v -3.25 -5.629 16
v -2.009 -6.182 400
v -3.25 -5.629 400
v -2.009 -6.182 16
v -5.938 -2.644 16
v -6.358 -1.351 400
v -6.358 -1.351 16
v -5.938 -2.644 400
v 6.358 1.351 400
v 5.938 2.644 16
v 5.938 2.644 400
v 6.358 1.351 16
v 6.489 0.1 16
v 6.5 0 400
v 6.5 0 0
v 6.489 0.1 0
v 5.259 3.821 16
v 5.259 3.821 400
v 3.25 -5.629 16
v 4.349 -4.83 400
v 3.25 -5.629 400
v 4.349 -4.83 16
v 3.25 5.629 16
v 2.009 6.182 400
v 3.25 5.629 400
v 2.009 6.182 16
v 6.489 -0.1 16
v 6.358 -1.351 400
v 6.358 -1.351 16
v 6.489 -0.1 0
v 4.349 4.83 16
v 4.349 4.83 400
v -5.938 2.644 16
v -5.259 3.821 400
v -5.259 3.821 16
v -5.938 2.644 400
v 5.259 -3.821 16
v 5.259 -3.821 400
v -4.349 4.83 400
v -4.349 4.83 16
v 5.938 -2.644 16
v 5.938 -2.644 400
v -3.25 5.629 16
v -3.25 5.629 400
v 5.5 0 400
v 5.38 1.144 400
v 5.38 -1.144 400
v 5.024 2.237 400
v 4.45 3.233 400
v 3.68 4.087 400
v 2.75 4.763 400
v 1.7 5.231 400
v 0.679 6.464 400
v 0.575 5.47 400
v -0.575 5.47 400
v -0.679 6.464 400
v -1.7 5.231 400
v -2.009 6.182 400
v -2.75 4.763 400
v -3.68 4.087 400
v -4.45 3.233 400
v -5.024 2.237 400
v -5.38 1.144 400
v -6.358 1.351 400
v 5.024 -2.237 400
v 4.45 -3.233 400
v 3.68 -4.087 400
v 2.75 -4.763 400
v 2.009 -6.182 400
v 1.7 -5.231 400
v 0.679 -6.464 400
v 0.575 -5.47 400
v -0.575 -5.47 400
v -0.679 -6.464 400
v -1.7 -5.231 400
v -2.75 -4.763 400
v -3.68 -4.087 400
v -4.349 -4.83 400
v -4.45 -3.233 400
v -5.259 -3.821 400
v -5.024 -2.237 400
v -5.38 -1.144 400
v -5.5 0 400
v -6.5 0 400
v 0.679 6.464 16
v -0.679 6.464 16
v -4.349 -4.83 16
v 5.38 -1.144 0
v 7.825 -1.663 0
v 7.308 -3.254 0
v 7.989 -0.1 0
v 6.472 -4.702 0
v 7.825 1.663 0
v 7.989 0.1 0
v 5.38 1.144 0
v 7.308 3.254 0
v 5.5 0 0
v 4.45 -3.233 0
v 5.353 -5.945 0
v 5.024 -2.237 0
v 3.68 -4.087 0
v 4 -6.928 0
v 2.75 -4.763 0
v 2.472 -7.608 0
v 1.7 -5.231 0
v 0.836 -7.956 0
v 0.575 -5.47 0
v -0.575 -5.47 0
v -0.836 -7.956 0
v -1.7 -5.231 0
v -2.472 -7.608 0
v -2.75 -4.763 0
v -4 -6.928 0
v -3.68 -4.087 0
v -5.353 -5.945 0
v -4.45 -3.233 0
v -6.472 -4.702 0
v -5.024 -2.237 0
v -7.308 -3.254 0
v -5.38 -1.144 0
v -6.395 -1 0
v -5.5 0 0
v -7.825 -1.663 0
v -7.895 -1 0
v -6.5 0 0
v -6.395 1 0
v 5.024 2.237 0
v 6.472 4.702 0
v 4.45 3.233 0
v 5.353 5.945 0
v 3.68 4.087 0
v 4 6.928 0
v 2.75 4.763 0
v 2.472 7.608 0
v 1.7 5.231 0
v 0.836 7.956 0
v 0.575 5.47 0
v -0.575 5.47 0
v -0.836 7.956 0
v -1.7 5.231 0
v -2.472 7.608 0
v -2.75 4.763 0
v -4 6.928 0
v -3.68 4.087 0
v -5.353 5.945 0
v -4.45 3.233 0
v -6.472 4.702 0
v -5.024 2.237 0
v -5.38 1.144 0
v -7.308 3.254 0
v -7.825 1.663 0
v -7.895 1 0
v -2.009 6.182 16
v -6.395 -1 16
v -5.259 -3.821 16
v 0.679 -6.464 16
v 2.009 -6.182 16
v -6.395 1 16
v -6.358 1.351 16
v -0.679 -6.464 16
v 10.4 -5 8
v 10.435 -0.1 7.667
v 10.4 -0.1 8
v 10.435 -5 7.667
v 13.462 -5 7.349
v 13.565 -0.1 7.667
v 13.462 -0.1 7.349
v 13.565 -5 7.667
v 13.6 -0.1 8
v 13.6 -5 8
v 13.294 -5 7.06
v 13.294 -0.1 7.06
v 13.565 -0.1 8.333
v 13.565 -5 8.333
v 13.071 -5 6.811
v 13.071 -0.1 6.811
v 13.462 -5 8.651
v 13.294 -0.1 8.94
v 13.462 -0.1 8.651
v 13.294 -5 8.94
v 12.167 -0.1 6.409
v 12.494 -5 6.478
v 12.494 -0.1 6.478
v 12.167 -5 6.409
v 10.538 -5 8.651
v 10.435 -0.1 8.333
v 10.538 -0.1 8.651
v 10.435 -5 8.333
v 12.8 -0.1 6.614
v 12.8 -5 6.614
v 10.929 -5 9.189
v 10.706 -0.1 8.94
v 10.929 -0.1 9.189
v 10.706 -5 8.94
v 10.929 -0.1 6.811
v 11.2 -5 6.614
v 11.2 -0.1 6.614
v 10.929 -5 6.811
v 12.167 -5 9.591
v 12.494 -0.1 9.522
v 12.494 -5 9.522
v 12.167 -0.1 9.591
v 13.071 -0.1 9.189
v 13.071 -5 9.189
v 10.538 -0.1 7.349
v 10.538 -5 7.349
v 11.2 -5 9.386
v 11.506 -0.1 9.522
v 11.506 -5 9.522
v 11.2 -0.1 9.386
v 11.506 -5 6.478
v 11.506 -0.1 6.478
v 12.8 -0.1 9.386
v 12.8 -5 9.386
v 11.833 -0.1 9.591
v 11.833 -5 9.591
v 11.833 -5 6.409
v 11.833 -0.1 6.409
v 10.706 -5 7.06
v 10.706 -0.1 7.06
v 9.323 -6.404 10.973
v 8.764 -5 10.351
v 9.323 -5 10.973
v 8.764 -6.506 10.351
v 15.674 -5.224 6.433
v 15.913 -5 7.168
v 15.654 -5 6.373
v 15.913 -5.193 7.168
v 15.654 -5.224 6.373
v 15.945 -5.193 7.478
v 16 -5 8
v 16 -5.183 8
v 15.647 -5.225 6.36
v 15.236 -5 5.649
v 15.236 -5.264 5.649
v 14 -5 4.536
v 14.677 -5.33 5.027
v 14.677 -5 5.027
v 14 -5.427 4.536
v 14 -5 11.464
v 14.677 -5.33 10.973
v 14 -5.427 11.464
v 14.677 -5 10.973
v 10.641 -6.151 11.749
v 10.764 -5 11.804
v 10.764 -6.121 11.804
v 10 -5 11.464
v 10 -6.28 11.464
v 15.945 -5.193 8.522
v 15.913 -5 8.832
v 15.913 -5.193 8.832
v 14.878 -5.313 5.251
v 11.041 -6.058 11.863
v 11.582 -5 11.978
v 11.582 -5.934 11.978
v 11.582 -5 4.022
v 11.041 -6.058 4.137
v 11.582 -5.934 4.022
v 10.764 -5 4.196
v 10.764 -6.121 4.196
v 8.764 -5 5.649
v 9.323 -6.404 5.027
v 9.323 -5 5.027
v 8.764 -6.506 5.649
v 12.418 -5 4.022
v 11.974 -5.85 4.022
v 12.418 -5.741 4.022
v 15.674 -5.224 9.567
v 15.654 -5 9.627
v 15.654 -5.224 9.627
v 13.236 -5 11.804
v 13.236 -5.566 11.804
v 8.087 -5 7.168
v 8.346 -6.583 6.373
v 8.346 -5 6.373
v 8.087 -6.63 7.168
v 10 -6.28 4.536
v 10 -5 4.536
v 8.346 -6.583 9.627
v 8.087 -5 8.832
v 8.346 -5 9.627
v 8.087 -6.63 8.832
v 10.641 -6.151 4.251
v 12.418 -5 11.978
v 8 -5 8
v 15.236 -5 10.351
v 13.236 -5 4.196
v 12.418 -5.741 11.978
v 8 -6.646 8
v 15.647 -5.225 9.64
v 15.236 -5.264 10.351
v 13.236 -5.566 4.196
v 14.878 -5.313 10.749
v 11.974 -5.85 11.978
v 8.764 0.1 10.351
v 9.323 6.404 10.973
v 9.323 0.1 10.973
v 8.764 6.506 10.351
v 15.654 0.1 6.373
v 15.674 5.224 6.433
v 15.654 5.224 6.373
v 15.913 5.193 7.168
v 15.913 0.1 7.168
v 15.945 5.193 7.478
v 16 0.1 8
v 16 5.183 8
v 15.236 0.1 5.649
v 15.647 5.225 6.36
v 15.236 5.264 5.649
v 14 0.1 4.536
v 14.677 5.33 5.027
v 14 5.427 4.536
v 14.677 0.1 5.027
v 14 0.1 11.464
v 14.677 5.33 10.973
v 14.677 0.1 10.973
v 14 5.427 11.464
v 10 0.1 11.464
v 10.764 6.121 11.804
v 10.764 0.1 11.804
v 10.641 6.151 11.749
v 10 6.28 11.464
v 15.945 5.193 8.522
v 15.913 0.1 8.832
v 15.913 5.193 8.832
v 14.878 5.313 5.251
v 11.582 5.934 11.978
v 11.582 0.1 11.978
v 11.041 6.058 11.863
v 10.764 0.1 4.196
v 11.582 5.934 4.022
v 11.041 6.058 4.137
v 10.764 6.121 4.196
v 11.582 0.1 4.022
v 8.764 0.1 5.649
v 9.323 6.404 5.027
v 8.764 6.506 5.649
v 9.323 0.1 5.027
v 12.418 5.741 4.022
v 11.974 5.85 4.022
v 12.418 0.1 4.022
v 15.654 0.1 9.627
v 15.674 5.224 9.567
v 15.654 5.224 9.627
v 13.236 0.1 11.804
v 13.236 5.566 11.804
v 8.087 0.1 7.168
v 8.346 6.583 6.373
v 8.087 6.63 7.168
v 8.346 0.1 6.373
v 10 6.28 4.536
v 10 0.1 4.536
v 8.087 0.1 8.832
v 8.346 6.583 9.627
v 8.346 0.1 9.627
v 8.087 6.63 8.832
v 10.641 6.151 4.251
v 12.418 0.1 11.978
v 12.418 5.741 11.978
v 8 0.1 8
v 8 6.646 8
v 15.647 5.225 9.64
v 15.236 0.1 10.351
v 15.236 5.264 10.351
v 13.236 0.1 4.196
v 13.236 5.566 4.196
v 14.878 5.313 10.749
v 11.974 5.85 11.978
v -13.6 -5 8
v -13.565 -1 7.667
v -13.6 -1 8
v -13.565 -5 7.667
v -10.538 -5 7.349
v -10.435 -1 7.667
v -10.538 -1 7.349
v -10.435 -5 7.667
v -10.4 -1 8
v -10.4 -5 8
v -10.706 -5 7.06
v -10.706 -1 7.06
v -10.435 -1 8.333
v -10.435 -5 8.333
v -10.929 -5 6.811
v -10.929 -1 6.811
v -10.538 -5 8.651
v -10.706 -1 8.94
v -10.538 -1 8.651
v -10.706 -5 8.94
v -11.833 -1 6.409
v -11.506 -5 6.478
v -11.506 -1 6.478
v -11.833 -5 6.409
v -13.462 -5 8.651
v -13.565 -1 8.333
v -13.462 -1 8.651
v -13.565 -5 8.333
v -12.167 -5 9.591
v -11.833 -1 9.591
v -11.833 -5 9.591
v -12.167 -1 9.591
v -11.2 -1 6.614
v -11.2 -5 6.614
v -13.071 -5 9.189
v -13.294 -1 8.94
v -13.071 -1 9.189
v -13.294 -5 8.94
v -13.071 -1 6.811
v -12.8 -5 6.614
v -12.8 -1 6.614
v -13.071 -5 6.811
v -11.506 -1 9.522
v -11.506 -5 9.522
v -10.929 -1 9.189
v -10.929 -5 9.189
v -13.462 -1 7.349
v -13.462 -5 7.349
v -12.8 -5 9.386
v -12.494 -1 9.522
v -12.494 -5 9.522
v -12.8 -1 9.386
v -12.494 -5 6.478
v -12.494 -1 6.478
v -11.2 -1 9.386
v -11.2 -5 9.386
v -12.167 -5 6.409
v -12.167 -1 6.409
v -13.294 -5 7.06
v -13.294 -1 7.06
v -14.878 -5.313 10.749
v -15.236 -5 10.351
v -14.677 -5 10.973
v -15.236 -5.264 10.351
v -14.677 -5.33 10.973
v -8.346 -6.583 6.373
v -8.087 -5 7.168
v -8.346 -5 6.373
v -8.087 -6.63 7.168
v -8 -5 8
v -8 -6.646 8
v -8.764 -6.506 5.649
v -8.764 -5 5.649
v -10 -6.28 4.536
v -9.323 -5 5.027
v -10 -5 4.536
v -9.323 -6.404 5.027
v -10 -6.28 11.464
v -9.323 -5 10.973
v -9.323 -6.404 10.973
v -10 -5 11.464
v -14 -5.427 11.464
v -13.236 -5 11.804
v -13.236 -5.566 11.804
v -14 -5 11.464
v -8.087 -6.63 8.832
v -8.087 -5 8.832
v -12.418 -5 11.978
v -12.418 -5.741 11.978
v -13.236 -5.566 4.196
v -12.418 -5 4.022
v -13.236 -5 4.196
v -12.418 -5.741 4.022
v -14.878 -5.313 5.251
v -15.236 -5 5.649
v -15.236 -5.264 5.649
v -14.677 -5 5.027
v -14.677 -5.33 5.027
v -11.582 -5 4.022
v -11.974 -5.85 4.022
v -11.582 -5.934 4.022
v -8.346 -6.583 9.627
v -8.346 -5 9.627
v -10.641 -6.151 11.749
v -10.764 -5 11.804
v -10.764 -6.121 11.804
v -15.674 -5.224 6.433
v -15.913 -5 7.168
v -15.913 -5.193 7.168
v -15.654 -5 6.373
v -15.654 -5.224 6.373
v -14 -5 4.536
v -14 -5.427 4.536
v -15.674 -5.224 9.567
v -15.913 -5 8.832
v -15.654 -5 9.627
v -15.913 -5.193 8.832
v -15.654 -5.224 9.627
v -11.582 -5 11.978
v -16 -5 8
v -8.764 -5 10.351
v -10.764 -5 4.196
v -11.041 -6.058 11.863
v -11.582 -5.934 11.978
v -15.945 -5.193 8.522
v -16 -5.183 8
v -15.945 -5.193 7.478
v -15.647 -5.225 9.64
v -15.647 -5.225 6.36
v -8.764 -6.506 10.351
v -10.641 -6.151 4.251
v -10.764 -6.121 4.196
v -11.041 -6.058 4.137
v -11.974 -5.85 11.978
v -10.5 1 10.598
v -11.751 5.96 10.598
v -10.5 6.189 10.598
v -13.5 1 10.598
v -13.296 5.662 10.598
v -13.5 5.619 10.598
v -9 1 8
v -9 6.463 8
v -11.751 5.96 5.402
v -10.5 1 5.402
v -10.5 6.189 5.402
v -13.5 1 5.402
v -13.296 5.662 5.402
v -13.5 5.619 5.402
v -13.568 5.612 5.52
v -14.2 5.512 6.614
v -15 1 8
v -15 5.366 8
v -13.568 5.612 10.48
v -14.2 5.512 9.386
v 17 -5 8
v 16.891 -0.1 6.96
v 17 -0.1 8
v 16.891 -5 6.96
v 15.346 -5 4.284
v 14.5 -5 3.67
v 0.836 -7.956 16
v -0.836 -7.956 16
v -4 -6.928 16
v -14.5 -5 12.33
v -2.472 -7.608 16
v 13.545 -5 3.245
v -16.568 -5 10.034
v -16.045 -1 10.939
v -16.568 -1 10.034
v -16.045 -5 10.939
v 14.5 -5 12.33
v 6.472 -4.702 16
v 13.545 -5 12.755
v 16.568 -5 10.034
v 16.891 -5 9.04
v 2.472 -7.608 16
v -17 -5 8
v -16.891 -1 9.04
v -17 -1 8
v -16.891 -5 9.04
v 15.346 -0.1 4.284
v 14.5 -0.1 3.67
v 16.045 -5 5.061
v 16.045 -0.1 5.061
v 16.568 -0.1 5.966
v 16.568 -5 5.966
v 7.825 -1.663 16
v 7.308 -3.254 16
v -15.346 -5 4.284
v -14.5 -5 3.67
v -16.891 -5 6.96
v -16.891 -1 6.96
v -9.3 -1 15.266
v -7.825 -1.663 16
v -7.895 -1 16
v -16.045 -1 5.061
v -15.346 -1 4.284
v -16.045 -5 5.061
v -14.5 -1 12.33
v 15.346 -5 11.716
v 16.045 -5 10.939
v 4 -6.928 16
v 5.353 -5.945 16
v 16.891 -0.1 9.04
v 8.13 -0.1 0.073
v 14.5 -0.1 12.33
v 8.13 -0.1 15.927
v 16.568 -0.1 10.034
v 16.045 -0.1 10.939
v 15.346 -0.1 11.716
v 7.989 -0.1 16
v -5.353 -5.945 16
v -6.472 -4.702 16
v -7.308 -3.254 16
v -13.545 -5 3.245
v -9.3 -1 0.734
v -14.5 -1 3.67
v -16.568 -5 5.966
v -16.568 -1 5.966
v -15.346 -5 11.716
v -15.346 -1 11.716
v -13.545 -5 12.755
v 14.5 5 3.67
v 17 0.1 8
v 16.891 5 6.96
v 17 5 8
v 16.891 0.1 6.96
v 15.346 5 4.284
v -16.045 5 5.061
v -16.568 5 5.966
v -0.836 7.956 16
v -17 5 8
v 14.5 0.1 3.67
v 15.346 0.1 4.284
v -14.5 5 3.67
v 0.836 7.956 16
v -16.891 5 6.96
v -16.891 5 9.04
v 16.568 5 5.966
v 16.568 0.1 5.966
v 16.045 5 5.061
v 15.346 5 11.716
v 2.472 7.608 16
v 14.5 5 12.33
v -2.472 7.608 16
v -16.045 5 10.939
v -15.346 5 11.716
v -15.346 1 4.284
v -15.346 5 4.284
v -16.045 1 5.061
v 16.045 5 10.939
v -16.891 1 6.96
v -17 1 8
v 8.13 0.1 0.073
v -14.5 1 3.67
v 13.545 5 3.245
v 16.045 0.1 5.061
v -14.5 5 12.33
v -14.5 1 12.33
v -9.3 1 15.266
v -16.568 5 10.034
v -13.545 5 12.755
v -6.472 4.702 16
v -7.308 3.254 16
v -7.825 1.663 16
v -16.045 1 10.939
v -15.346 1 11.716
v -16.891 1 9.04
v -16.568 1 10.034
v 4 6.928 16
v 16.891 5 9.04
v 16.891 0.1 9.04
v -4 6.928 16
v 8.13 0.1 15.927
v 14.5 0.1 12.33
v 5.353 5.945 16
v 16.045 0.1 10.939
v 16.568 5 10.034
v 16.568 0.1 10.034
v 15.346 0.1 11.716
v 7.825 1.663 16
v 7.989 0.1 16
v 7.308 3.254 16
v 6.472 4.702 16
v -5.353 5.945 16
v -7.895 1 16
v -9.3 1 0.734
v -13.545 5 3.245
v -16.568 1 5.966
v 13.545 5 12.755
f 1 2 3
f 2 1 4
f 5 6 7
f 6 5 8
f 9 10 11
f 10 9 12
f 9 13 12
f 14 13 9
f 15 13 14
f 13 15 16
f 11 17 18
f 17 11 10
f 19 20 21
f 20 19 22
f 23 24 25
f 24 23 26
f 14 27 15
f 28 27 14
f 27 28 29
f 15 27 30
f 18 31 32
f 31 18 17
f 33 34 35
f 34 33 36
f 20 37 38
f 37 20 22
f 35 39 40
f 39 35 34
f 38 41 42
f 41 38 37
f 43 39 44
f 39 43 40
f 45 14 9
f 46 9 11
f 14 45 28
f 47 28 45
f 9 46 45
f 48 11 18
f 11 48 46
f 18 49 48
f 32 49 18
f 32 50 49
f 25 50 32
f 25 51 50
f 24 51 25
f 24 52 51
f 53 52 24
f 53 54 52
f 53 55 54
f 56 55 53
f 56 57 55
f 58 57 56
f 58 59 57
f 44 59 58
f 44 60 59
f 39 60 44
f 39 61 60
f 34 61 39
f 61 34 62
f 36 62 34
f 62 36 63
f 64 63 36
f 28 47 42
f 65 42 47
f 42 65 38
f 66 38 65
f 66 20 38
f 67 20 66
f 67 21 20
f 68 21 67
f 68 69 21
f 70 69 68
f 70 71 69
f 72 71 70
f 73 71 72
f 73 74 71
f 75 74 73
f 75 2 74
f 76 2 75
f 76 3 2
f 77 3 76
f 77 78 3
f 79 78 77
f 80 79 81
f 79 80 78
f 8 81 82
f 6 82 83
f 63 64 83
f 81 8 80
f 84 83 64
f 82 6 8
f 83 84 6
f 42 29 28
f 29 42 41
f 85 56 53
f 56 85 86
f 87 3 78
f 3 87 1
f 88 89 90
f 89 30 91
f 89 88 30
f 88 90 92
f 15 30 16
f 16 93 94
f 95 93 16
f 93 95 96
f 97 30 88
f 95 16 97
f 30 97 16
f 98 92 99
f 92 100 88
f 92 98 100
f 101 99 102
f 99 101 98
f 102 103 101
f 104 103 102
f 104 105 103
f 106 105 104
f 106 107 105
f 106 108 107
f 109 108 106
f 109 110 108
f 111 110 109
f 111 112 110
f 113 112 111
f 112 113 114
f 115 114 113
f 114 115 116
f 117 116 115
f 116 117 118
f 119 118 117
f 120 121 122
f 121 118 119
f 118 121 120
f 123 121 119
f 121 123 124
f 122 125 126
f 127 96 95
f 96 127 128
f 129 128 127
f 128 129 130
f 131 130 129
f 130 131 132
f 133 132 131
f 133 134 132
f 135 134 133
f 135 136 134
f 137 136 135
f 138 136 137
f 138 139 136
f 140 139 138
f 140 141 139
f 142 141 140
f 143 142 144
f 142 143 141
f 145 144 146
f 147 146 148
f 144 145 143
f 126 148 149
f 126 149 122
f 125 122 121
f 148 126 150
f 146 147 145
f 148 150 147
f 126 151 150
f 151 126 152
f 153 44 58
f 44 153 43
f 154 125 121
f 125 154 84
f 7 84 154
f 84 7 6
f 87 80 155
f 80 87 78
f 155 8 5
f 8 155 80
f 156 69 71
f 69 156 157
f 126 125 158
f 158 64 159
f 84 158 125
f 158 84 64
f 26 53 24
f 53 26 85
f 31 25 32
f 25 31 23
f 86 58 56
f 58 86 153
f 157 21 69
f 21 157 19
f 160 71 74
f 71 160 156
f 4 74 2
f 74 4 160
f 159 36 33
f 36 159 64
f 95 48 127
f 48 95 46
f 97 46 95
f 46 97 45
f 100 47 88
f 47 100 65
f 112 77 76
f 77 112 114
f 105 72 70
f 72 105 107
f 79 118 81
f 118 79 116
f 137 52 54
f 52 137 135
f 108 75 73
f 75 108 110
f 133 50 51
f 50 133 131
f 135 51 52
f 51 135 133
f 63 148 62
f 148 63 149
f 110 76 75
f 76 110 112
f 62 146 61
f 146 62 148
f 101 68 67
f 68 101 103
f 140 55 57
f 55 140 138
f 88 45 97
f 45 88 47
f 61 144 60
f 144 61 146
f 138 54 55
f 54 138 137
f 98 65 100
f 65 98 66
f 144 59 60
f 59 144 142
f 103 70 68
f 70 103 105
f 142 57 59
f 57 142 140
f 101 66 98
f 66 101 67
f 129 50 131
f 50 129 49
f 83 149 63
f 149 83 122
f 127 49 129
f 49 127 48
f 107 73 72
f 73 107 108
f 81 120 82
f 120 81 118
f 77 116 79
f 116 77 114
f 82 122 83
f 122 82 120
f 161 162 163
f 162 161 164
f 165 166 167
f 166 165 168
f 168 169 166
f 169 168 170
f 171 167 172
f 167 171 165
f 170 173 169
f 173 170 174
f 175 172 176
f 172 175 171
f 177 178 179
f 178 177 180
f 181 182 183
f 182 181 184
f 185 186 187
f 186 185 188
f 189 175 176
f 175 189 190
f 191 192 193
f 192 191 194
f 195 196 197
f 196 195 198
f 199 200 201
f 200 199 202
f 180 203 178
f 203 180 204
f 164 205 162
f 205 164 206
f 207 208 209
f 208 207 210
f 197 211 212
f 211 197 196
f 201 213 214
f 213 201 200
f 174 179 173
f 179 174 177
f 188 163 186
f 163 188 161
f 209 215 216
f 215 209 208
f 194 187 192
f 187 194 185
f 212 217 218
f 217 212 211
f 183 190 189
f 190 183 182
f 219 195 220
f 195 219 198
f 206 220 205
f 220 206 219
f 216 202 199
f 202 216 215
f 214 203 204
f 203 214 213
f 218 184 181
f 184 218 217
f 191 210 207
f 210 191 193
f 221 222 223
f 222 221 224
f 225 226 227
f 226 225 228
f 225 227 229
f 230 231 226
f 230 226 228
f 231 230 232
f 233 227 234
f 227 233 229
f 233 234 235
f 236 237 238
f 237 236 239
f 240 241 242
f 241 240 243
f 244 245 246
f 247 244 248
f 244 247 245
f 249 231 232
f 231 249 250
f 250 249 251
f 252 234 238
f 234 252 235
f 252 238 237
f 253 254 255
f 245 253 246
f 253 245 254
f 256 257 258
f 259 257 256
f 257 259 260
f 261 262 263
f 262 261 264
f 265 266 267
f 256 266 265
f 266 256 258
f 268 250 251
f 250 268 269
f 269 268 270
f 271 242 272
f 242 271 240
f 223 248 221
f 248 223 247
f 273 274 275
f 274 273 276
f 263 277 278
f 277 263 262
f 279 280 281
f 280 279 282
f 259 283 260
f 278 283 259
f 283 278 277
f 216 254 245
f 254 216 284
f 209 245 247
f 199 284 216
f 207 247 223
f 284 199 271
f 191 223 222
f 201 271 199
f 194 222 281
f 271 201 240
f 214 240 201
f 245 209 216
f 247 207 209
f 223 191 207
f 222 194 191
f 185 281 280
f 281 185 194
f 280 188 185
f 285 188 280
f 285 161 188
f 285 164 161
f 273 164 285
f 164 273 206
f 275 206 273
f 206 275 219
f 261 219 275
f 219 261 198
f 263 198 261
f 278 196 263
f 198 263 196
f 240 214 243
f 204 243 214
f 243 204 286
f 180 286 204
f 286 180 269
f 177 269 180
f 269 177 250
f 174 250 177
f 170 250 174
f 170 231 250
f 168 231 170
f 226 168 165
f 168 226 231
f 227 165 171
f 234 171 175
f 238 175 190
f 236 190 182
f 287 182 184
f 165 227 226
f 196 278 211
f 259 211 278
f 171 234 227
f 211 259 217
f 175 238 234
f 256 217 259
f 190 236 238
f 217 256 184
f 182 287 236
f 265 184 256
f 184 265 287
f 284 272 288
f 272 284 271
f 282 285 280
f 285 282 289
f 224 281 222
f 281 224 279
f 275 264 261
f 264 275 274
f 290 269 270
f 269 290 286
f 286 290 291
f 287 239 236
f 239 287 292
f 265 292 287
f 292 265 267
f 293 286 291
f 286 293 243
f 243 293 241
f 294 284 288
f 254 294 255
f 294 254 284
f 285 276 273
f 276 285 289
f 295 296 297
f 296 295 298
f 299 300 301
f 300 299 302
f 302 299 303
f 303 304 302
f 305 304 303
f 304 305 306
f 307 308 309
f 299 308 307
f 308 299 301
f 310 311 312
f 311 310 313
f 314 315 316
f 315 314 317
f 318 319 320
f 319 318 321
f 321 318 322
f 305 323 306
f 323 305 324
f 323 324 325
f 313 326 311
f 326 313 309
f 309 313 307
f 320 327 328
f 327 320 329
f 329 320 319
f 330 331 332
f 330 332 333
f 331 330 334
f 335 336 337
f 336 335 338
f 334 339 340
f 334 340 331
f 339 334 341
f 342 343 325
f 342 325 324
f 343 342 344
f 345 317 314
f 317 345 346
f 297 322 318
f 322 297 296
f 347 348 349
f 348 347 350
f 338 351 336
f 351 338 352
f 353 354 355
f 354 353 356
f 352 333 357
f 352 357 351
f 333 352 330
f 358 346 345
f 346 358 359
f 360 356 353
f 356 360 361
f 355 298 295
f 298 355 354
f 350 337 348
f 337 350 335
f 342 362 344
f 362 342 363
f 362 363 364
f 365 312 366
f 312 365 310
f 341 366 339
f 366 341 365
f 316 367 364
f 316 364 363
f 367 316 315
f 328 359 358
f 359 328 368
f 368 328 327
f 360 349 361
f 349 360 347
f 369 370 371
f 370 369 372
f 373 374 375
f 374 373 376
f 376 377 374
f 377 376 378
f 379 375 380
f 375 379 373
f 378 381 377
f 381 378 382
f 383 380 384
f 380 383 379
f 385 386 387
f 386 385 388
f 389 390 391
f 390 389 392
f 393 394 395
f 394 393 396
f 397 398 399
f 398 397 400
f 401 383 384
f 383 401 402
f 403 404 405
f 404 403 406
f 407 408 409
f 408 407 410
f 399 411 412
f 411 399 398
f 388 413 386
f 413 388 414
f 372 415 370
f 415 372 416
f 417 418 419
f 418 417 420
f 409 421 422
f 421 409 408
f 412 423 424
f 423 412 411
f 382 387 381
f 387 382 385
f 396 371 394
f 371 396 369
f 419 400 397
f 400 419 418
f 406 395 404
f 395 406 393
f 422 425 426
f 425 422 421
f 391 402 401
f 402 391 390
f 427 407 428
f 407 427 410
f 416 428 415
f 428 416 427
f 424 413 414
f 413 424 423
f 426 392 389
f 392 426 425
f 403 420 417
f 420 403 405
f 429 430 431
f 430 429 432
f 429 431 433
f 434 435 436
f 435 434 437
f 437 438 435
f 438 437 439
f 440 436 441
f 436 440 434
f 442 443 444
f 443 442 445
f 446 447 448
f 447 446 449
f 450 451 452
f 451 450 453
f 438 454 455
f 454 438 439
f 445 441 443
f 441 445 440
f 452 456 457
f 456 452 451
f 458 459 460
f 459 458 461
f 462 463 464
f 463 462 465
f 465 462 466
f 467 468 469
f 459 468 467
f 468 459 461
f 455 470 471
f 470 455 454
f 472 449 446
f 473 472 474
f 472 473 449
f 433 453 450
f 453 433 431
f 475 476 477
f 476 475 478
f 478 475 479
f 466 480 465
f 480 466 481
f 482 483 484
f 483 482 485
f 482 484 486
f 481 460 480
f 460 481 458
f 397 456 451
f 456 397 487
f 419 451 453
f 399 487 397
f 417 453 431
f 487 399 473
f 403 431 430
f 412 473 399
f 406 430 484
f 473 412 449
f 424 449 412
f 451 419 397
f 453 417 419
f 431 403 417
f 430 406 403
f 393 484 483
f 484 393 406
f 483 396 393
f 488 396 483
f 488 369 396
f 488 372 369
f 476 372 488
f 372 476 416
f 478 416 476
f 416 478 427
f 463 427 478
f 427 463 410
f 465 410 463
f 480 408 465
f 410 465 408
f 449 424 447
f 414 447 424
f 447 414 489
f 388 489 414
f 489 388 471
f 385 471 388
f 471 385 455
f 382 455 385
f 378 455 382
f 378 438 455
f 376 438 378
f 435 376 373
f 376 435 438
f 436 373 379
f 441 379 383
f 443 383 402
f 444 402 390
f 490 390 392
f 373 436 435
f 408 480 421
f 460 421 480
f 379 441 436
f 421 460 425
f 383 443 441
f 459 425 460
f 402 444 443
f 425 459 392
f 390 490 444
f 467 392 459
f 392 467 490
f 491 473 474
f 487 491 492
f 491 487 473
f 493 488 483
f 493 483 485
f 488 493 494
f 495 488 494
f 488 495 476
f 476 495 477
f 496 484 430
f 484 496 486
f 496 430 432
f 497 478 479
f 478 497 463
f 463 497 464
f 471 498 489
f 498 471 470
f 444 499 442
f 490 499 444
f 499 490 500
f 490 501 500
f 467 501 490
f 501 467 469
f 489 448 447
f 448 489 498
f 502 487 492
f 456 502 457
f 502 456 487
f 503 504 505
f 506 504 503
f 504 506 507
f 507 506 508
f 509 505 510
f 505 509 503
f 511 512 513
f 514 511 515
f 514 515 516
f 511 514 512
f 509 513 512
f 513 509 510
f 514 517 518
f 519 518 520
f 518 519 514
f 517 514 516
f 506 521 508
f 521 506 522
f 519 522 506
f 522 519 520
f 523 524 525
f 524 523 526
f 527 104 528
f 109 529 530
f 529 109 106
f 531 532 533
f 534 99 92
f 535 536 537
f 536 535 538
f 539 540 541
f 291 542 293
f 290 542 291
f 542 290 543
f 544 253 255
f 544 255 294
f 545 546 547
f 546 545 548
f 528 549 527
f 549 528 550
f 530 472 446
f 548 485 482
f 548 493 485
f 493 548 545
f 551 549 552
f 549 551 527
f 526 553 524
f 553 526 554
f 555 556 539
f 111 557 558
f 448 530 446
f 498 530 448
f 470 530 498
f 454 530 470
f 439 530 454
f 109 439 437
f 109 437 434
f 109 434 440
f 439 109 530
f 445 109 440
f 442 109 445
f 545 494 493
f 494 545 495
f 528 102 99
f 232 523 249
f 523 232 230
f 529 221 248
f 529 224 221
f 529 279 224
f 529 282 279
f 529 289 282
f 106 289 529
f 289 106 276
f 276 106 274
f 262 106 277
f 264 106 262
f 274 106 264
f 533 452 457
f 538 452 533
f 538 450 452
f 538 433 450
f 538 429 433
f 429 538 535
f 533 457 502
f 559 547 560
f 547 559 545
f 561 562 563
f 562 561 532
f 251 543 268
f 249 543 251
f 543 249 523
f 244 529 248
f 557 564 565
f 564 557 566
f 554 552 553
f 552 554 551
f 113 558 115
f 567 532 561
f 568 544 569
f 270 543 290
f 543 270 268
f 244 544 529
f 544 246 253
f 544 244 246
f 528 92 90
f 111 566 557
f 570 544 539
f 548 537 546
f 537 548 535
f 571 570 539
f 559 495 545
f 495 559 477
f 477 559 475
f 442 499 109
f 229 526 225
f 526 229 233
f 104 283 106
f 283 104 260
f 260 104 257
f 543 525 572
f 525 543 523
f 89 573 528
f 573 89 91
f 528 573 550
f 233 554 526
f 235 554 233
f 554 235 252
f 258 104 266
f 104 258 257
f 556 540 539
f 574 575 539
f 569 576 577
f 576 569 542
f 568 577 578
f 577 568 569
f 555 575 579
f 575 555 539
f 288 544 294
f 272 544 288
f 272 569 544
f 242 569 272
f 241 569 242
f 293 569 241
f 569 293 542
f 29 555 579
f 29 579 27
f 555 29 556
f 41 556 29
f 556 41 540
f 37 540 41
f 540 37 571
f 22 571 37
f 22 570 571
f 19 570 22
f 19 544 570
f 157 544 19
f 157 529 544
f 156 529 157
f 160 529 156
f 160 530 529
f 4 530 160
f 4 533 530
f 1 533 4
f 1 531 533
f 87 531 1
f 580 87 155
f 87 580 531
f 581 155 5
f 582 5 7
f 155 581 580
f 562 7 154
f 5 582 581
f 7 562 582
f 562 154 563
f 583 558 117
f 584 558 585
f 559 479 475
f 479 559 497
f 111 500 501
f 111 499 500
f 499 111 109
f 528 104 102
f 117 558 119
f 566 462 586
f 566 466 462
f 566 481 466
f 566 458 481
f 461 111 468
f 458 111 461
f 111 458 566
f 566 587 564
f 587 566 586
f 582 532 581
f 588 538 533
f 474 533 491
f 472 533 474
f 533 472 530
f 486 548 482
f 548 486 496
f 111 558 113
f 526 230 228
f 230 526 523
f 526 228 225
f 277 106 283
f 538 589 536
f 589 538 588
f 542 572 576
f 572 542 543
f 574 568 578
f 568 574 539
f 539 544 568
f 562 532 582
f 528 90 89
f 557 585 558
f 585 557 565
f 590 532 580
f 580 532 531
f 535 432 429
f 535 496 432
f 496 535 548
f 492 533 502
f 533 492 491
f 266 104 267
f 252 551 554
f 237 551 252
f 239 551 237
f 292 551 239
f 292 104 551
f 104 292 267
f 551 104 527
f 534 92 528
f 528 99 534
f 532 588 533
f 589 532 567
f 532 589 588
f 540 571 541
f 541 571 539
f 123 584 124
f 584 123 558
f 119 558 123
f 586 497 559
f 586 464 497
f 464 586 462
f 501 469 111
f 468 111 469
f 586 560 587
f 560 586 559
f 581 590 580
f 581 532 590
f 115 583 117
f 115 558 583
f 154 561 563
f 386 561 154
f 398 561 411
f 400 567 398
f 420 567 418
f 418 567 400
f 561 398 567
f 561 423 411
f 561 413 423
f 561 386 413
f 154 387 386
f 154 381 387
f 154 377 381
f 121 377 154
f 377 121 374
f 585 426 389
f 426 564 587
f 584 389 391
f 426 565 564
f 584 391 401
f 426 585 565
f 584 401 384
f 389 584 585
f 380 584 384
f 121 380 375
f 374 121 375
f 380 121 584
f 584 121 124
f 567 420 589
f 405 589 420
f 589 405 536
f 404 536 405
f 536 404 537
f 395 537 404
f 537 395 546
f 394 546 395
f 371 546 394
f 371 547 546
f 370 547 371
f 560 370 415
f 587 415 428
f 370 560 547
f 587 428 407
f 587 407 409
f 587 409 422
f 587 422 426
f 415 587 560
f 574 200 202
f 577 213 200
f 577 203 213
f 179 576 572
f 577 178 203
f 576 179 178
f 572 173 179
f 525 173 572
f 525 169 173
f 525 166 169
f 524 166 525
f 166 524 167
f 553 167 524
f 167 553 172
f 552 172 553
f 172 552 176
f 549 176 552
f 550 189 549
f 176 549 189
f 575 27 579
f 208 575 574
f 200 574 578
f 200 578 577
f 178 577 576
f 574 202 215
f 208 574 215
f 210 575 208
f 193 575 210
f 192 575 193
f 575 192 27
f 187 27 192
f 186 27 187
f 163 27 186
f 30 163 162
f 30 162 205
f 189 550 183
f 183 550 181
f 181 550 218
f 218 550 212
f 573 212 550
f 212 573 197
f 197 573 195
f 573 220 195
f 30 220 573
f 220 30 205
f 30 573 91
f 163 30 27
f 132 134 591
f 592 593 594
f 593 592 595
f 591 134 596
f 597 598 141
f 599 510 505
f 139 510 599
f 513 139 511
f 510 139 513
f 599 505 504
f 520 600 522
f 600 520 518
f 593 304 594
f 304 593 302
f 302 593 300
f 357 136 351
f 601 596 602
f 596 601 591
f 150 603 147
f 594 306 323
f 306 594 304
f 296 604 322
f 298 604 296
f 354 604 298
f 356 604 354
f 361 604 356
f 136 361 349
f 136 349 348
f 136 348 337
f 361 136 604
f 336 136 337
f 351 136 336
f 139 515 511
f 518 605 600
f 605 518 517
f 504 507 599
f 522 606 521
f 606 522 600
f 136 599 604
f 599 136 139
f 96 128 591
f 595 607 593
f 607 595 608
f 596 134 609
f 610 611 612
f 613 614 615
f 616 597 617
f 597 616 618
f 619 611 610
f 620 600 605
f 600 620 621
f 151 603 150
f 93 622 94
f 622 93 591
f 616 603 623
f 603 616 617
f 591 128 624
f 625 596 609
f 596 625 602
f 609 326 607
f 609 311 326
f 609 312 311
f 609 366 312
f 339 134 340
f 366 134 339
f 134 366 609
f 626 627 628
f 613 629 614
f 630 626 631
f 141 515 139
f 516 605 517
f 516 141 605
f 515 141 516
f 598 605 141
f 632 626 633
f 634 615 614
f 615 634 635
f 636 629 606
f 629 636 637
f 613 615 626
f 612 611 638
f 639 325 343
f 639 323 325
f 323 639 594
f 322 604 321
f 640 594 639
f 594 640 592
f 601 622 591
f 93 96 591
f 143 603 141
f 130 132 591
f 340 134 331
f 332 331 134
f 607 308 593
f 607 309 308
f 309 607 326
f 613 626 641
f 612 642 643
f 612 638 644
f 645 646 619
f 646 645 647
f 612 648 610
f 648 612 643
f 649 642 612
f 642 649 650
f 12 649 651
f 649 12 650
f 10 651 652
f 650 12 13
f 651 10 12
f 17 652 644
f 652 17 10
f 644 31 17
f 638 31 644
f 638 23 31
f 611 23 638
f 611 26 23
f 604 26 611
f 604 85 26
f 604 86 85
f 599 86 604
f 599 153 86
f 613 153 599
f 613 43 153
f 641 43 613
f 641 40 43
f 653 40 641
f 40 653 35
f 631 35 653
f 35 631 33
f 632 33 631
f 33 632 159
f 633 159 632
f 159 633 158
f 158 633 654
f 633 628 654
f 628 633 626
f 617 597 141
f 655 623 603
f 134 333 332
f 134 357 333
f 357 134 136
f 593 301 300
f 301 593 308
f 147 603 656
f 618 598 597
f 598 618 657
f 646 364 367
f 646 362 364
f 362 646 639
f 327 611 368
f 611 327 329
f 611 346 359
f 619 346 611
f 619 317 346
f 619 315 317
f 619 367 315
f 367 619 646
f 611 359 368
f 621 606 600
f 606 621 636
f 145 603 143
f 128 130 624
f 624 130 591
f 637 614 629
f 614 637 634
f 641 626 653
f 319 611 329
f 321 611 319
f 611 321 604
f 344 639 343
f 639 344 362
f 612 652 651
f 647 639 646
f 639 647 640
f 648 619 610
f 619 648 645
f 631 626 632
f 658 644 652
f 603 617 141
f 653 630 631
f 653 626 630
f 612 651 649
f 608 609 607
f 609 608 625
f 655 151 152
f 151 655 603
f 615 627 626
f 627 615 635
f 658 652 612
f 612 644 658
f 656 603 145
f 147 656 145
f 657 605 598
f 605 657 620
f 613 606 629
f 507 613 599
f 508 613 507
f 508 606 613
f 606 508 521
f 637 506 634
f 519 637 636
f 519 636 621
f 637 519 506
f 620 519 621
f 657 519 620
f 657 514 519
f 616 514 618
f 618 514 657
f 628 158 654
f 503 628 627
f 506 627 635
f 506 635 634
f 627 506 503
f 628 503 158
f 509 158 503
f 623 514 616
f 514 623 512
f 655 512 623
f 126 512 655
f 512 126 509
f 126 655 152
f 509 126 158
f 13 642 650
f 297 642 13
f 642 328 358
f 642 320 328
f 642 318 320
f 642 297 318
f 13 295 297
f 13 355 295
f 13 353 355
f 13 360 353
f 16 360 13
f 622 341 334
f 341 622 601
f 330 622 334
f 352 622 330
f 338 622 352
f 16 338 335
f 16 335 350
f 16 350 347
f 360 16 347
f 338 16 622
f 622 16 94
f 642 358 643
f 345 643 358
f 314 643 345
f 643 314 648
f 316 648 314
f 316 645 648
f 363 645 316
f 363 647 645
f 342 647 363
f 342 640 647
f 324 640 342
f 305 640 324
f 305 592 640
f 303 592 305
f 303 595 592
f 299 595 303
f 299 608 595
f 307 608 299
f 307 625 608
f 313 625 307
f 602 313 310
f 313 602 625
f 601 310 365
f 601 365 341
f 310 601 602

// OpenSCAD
// file: lib/ALU_profile_holder_top.scad
include <../../parameters.scad>



module ALU_profile_holder_top(deep=35) {
    wall_thickness = ALU_profile_holder_wall_thickness;
    
    module screw_holes() {
        translate([wall_thickness/2, 8, ALU_profile_width/2]) {
            rotate([0, 90, 0]) 
                cylinder(d=M6_screw_diameter, h=wall_thickness*2, center=true, $fn=20);
        }
        translate([wall_thickness/2, deep-10, ALU_profile_width/2]) {
                rotate([0, 90, 0])
                cylinder(d=M6_screw_diameter, h=wall_thickness*2, center=true, $fn=20);
            
        }
    }
    
    difference() {
        cube([ALU_profile_width+wall_thickness*2, deep+wall_thickness*2, ALU_profile_width]);
        translate([wall_thickness, -0.1, -0.1])
            cube([ALU_profile_width, deep+0.1, ALU_profile_width+0.2]);
        
        screw_holes();
        translate([ALU_profile_width+wall_thickness, 0, 0])
            screw_holes();
    }
}

ALU_profile_holder_top(35);
// file: ../parameters.scad
maximum_printable_size = 150;

layer_thickness = 0.3;
global_clearance = 0.5;


//Screw diameter and nut for M10 [mm]
M10_screw_diameter = 10.4;
M10_head_height = 10;
M10_head_diameter = 16+0.5;
M10_nut_height = 10.5;
M10_nut_diameter = 25.5;
M10_nut_pocket = 22.3;

//Screw diameter for M8 [mm]
M8_screw_diameter = 8.6;
M8_head_height = 8;
M8_head_diameter = 13.5;
M8_nut_height = 7.5;
M8_square_nut_thin_height = 4.5;
M8_nut_diameter = 14.4 + 0.5;
M8_nut_pocket = 13 + 0.5;
M8_washer_diameter = 16;
M8_washer_thickness = 1.5;


//Screw diameter and nut for M6 [mm]
M6_screw_diameter=6.5;
M6_head_diameter = 10+0.5;
M6_head_height = 6;
M6_nut_height = 4.9;
M6_nut_diameter = 11.8;
M6_nut_pocket = 10.4;
M6_square_nut_height = 3;
M6_square_nut_diameter = 10;
M6_washer_thickness = 1.6;

//Screw diameter and nut for M5 [mm]
M5_screw_diameter=5.5;
M5_head_height = 5;
M5_head_diameter = 13+0.5;
M5_nut_height = 4.5;
M5_nut_diameter = 9.4;
M5_nut_pocket = 8.4;

//Screw diameter and nut for M4 [mm]
M4_screw_diameter=4.5;
M4_screw_head_height = 4;
M4_nut_height = 3.2;
M4_nut_diameter = 8.4;
M4_nut_pocket = 7.5;

//Screw diameter and nut for M3 [mm]
M3_screw_diameter = 3.2;
M3_nut_height = 2.7;
M3_nut_diameter = 6.6;
M3_nut_pocket = 5.6;
M3_screw_head_height = 3;

//Screw diameter and nut for M2,5 [mm]
M2_5_screw_diameter = 2.7;
M2_5_nut_height = 2.3;
M2_5_nut_diameter = 6;
M2_5_nut_pocket = 5.5;

// kulove lozisko

bearing_efsm_08_h = 33+1;
bearing_efsm_08_m = 22;
bearing_efsm_08_db = 18;
bearing_efsm_08_ag = 10.5;
bearing_efsm_08_n = M4_screw_diameter;
bearing_efsm_08_a1 = 5.5;
bearing_efsm_08_d = 8.25;
bearing_efsm_08_B = 8; // ball height

bearing_efsm_10_h = 38+1;
bearing_efsm_10_m = 26;
bearing_efsm_10_db = 21.9;
bearing_efsm_10_ag = 12+0.2;
bearing_efsm_10_n = M5_screw_diameter;
bearing_efsm_10_a1 = 6.5;
bearing_efsm_10_d = 10.25;


bearing_efsm_12_width = 40+1;
bearing_efsm_12_h = bearing_efsm_12_width;
bearing_efsm_12_boltd = 28/2; // polovina vzdalenosti mezi srouby
bearing_efsm_12_m = bearing_efsm_12_boltd*2;
bearing_efsm_12_db = 25;
bearing_efsm_12_ag = 13;
bearing_efsm_12_a1 = 7;
bearing_efsm_12_n = M5_screw_diameter;
bearing_efsm_12_d = 12.15;
bearing_efsm_12_B = 10; // ball height
bearing_efsm_space = 1;

bearing_efsm_17_width = 54+1;
bearing_efsm_17_h = bearing_efsm_17_width;
bearing_efsm_17_boltd = 38/2; // polovina vzdalenosti mezi srouby
bearing_efsm_17_m = bearing_efsm_17_boltd*2;
bearing_efsm_17_db = 35;
bearing_efsm_17_ag = 18;
bearing_efsm_17_n = M6_screw_diameter;
bearing_efsm_17_a1 = 10;
bearing_efsm_17_B = 17; // ball height

//limcove lozisko
bearing_EFOM_10_L=26; //celkova sirka zakladny
bearing_EFOM_10_d1=10.3;//diametr otvoru real=10 mm
bearing_EFOM_10_dB=22;//diametr vystupku pro ulozeni lozika
bearing_EFOM_10_H=52;//celková delka zakladny
bearing_EFOM_10_J=36;// hole pitch
bearing_EFOM_10_A1=6.5;//vyska pouzdra
bearing_EFOM_10_Ag=12;//celkova vyska
bearing_EFOM_10_N1=5;//sirka otvoru pro sroub
bearing_EFOM_10_N2=8;//delka otvoru pro sroub
bearing_EFOM_10_m=36;//roztec der pro sroub
bearing_EFOM_10_h=9;//vyska lozika


608_bearing_outer_diameter = 22.3;
608_bearing_inner_diameter = 16;
608_bearing_thickness = 7.1;


// 20 KG servo parameters

servo_20kg_axis_offset = 9.375; // jak je osa mimo stredu
servo_20kg_body_x = 42;
servo_20kg_body_y = 21;
servo_20kg_body_z = 40;
servo_20kg_thread_x = 49/2;
servo_20kg_thread_y = 10/2;
servo_20kg_body_below = 10; // jak hluboko je tělo serva pod drzaky na srouby
servo_20kg_below = 25.8; // jak hluboko je páka serva pod drzaky na srouby

servo_20kg_bolt_d = 2.5+0.3;
servo_20kg_nut_d = 5+0.3;


//strain gauge
strain_gauge_width = 12.7;
strain_gauge_length = 75.1;
strain_gauge_screw_distance = 10;

//ALU profile
ALU_profile_width = 30.5;
ALU_profile_holder_wall_thickness = 3;
ALU_profile_groove_width = 8;

//pillow block bearing
//https://www.igus.eu/product/372
//Part no. KSTM-08
KSTM08_screws_distance = 33;         //m
KSTM08_screws_holes_diameter = 4.5;  //d2
KSTM08_flange_thickness = 6;         //h3
KSTM08_case_width = 9;               //C1
KSTM08_case_length = 47;             //a
KSTM08_ball_width = 12;              //B
KSTM08_ball_hole_diameter = 7.85;    //d1


//ložiska pro malý rotor
bearing_outer_diameter = 10.2;    // Rozměr B1 v nákresu s přídavkem na toleranci otvoru
bearing_thickness = 4;        // Rozměr B2 v nákresu
//bearing_shaft_length = 19.5;    // Rozměr B3 v nákresu, Originalni hodnota 19.5
bearing_shaft_length = 20;    // Rozměr B3 v nákresu


//simple platform parameters ////////////////////////////////////////////


// Main cube profile lengths
profile_length_x = 600;
profile_length_y = 600;
profile_length_z = 260;


compresor_length_x = 410;
compresor_length_y = 140;
compresor_length_z = 310;


front_holder_width = 160;
front_holder_angle = 25;
front_holder_height = 60;
front_holder_offset = 15;
front_holder_height_offset = 75;

// lock moving servo parameters
// static par.
servo_length = 23.2;
servo_width = 10.1;
servo_height = 20;
servo_axle_offset = 12.5;
servo_axle_height = 5;
servo_movement_angle = 70;
servo_movement_angle_offset = -35; // angle offset up
servo_force = 0.43; // [N/m] torque of servo

// dynamic par.
servo_arm_length = servo_width/2+ALU_profile_width/2+ALU_profile_holder_wall_thickness;
servo_travel_y = cos((servo_movement_angle-abs(servo_movement_angle_offset))/2)*servo_arm_length;
servo_arm_hole_length = (servo_arm_length/cos(servo_movement_angle/2))-servo_arm_length+M3_screw_diameter;
servo_joint_offset = sin(servo_movement_angle+servo_movement_angle_offset)*(servo_arm_length+servo_arm_hole_length)+servo_axle_offset;
servo_joint_offset_by_angle = -tan(servo_movement_angle_offset)*servo_arm_length;
servo_max_linear_force = servo_force/(servo_arm_length/1000); // max servo linear force [N]
servo_min_linear_force = cos(servo_movement_angle+abs(servo_movement_angle_offset))*servo_max_linear_force; // min servo linear force [N] in the most extreme position
servo_holding_linear_force = cos(servo_movement_angle+servo_movement_angle_offset)*servo_max_linear_force; // min servo linear force [N] in holding position

// lock static parameters
lock_screws_dia = 3.08;
lock_depth = 20;
lock_axle_diameter = 15;
lock_grab_axle_dia = 13;
lock_arms_joint_offset = 30;
lock_arms_joint_angle = 89;
lock_tooth_width = 2;

// lock dynamic parameters
lock_push_force = (servo_holding_linear_force/cos(lock_arms_joint_angle))/cos(lock_arms_joint_angle); // lock arm pushing force on linear servo joint
lock_push_arm_length = 45;
lock_arm_force_ratio = 1; // lock arm change holding force ratio (0.5 = arm will have half holding force)
lock_hold_arm_length = lock_push_arm_length/lock_arm_force_ratio;
lock_holding_force = lock_push_force*lock_arm_force_ratio;
lock_joint_arm_length = lock_push_arm_length;
// main file
include <../parameters.scad>
use <./lib/ALU_profile_holder_top.scad>


module carbon_tube() {
	difference() {
		cylinder(d=13, h=400, $fn=30);

		translate([0, 0, -1])
		cylinder(d=11, h=402, $fn=30);
	}
}

module 888_3002(side=true) {
	difference() {
		union() {
			hull() {
				cylinder(d=16, h=16, $fn=30);

				translate([-12, -5, 8])
				rotate([-90, 0, 0])
				cylinder(d=10, h=10, $fn=30);

				translate([12, -5, 8])
				rotate([-90, 0, 0])
				cylinder(d=10, h=10, $fn=30);

			}
		}
		
		// cut side
		if(side) {
			translate([-30, 0, -5])
			cube([100, 50, 40]);
		} else {
			translate([-30, -50, -5])
			cube([100, 50, 40]);
		}
		
		// carbon tube
		translate([0, 0, -10])
		cylinder(d=13, h=400, $fn=30);

		// tube axle screw
		translate([12, -8, 8])
		rotate([-90, 0, 0])
		union() {
			cylinder(d=3.2, h=16, $fn=30);
			
			cylinder(d=8, h=3, $fn=30);

			translate([0, 0, 8])
			cylinder(d=8, h=8, $fn=30);
		}

		// tube holding screw
		translate([-12, -8, 8])
		rotate([-90, 0, 0])
		union() {
			cylinder(d=3.2, h=16, $fn=30);
			
			cylinder(d=8, h=3, $fn=30);

			translate([0, 0, 8])
			cylinder(d=6, h=8, $fn=6);
		}

		// part gap
		translate([-20, -1, -1])
		cube([20, 2, 20]);

		translate([0, -.1, -1])
		cube([20, .2, 20]);
	}
}

#carbon_tube();

888_3002();
888_3002(false);
